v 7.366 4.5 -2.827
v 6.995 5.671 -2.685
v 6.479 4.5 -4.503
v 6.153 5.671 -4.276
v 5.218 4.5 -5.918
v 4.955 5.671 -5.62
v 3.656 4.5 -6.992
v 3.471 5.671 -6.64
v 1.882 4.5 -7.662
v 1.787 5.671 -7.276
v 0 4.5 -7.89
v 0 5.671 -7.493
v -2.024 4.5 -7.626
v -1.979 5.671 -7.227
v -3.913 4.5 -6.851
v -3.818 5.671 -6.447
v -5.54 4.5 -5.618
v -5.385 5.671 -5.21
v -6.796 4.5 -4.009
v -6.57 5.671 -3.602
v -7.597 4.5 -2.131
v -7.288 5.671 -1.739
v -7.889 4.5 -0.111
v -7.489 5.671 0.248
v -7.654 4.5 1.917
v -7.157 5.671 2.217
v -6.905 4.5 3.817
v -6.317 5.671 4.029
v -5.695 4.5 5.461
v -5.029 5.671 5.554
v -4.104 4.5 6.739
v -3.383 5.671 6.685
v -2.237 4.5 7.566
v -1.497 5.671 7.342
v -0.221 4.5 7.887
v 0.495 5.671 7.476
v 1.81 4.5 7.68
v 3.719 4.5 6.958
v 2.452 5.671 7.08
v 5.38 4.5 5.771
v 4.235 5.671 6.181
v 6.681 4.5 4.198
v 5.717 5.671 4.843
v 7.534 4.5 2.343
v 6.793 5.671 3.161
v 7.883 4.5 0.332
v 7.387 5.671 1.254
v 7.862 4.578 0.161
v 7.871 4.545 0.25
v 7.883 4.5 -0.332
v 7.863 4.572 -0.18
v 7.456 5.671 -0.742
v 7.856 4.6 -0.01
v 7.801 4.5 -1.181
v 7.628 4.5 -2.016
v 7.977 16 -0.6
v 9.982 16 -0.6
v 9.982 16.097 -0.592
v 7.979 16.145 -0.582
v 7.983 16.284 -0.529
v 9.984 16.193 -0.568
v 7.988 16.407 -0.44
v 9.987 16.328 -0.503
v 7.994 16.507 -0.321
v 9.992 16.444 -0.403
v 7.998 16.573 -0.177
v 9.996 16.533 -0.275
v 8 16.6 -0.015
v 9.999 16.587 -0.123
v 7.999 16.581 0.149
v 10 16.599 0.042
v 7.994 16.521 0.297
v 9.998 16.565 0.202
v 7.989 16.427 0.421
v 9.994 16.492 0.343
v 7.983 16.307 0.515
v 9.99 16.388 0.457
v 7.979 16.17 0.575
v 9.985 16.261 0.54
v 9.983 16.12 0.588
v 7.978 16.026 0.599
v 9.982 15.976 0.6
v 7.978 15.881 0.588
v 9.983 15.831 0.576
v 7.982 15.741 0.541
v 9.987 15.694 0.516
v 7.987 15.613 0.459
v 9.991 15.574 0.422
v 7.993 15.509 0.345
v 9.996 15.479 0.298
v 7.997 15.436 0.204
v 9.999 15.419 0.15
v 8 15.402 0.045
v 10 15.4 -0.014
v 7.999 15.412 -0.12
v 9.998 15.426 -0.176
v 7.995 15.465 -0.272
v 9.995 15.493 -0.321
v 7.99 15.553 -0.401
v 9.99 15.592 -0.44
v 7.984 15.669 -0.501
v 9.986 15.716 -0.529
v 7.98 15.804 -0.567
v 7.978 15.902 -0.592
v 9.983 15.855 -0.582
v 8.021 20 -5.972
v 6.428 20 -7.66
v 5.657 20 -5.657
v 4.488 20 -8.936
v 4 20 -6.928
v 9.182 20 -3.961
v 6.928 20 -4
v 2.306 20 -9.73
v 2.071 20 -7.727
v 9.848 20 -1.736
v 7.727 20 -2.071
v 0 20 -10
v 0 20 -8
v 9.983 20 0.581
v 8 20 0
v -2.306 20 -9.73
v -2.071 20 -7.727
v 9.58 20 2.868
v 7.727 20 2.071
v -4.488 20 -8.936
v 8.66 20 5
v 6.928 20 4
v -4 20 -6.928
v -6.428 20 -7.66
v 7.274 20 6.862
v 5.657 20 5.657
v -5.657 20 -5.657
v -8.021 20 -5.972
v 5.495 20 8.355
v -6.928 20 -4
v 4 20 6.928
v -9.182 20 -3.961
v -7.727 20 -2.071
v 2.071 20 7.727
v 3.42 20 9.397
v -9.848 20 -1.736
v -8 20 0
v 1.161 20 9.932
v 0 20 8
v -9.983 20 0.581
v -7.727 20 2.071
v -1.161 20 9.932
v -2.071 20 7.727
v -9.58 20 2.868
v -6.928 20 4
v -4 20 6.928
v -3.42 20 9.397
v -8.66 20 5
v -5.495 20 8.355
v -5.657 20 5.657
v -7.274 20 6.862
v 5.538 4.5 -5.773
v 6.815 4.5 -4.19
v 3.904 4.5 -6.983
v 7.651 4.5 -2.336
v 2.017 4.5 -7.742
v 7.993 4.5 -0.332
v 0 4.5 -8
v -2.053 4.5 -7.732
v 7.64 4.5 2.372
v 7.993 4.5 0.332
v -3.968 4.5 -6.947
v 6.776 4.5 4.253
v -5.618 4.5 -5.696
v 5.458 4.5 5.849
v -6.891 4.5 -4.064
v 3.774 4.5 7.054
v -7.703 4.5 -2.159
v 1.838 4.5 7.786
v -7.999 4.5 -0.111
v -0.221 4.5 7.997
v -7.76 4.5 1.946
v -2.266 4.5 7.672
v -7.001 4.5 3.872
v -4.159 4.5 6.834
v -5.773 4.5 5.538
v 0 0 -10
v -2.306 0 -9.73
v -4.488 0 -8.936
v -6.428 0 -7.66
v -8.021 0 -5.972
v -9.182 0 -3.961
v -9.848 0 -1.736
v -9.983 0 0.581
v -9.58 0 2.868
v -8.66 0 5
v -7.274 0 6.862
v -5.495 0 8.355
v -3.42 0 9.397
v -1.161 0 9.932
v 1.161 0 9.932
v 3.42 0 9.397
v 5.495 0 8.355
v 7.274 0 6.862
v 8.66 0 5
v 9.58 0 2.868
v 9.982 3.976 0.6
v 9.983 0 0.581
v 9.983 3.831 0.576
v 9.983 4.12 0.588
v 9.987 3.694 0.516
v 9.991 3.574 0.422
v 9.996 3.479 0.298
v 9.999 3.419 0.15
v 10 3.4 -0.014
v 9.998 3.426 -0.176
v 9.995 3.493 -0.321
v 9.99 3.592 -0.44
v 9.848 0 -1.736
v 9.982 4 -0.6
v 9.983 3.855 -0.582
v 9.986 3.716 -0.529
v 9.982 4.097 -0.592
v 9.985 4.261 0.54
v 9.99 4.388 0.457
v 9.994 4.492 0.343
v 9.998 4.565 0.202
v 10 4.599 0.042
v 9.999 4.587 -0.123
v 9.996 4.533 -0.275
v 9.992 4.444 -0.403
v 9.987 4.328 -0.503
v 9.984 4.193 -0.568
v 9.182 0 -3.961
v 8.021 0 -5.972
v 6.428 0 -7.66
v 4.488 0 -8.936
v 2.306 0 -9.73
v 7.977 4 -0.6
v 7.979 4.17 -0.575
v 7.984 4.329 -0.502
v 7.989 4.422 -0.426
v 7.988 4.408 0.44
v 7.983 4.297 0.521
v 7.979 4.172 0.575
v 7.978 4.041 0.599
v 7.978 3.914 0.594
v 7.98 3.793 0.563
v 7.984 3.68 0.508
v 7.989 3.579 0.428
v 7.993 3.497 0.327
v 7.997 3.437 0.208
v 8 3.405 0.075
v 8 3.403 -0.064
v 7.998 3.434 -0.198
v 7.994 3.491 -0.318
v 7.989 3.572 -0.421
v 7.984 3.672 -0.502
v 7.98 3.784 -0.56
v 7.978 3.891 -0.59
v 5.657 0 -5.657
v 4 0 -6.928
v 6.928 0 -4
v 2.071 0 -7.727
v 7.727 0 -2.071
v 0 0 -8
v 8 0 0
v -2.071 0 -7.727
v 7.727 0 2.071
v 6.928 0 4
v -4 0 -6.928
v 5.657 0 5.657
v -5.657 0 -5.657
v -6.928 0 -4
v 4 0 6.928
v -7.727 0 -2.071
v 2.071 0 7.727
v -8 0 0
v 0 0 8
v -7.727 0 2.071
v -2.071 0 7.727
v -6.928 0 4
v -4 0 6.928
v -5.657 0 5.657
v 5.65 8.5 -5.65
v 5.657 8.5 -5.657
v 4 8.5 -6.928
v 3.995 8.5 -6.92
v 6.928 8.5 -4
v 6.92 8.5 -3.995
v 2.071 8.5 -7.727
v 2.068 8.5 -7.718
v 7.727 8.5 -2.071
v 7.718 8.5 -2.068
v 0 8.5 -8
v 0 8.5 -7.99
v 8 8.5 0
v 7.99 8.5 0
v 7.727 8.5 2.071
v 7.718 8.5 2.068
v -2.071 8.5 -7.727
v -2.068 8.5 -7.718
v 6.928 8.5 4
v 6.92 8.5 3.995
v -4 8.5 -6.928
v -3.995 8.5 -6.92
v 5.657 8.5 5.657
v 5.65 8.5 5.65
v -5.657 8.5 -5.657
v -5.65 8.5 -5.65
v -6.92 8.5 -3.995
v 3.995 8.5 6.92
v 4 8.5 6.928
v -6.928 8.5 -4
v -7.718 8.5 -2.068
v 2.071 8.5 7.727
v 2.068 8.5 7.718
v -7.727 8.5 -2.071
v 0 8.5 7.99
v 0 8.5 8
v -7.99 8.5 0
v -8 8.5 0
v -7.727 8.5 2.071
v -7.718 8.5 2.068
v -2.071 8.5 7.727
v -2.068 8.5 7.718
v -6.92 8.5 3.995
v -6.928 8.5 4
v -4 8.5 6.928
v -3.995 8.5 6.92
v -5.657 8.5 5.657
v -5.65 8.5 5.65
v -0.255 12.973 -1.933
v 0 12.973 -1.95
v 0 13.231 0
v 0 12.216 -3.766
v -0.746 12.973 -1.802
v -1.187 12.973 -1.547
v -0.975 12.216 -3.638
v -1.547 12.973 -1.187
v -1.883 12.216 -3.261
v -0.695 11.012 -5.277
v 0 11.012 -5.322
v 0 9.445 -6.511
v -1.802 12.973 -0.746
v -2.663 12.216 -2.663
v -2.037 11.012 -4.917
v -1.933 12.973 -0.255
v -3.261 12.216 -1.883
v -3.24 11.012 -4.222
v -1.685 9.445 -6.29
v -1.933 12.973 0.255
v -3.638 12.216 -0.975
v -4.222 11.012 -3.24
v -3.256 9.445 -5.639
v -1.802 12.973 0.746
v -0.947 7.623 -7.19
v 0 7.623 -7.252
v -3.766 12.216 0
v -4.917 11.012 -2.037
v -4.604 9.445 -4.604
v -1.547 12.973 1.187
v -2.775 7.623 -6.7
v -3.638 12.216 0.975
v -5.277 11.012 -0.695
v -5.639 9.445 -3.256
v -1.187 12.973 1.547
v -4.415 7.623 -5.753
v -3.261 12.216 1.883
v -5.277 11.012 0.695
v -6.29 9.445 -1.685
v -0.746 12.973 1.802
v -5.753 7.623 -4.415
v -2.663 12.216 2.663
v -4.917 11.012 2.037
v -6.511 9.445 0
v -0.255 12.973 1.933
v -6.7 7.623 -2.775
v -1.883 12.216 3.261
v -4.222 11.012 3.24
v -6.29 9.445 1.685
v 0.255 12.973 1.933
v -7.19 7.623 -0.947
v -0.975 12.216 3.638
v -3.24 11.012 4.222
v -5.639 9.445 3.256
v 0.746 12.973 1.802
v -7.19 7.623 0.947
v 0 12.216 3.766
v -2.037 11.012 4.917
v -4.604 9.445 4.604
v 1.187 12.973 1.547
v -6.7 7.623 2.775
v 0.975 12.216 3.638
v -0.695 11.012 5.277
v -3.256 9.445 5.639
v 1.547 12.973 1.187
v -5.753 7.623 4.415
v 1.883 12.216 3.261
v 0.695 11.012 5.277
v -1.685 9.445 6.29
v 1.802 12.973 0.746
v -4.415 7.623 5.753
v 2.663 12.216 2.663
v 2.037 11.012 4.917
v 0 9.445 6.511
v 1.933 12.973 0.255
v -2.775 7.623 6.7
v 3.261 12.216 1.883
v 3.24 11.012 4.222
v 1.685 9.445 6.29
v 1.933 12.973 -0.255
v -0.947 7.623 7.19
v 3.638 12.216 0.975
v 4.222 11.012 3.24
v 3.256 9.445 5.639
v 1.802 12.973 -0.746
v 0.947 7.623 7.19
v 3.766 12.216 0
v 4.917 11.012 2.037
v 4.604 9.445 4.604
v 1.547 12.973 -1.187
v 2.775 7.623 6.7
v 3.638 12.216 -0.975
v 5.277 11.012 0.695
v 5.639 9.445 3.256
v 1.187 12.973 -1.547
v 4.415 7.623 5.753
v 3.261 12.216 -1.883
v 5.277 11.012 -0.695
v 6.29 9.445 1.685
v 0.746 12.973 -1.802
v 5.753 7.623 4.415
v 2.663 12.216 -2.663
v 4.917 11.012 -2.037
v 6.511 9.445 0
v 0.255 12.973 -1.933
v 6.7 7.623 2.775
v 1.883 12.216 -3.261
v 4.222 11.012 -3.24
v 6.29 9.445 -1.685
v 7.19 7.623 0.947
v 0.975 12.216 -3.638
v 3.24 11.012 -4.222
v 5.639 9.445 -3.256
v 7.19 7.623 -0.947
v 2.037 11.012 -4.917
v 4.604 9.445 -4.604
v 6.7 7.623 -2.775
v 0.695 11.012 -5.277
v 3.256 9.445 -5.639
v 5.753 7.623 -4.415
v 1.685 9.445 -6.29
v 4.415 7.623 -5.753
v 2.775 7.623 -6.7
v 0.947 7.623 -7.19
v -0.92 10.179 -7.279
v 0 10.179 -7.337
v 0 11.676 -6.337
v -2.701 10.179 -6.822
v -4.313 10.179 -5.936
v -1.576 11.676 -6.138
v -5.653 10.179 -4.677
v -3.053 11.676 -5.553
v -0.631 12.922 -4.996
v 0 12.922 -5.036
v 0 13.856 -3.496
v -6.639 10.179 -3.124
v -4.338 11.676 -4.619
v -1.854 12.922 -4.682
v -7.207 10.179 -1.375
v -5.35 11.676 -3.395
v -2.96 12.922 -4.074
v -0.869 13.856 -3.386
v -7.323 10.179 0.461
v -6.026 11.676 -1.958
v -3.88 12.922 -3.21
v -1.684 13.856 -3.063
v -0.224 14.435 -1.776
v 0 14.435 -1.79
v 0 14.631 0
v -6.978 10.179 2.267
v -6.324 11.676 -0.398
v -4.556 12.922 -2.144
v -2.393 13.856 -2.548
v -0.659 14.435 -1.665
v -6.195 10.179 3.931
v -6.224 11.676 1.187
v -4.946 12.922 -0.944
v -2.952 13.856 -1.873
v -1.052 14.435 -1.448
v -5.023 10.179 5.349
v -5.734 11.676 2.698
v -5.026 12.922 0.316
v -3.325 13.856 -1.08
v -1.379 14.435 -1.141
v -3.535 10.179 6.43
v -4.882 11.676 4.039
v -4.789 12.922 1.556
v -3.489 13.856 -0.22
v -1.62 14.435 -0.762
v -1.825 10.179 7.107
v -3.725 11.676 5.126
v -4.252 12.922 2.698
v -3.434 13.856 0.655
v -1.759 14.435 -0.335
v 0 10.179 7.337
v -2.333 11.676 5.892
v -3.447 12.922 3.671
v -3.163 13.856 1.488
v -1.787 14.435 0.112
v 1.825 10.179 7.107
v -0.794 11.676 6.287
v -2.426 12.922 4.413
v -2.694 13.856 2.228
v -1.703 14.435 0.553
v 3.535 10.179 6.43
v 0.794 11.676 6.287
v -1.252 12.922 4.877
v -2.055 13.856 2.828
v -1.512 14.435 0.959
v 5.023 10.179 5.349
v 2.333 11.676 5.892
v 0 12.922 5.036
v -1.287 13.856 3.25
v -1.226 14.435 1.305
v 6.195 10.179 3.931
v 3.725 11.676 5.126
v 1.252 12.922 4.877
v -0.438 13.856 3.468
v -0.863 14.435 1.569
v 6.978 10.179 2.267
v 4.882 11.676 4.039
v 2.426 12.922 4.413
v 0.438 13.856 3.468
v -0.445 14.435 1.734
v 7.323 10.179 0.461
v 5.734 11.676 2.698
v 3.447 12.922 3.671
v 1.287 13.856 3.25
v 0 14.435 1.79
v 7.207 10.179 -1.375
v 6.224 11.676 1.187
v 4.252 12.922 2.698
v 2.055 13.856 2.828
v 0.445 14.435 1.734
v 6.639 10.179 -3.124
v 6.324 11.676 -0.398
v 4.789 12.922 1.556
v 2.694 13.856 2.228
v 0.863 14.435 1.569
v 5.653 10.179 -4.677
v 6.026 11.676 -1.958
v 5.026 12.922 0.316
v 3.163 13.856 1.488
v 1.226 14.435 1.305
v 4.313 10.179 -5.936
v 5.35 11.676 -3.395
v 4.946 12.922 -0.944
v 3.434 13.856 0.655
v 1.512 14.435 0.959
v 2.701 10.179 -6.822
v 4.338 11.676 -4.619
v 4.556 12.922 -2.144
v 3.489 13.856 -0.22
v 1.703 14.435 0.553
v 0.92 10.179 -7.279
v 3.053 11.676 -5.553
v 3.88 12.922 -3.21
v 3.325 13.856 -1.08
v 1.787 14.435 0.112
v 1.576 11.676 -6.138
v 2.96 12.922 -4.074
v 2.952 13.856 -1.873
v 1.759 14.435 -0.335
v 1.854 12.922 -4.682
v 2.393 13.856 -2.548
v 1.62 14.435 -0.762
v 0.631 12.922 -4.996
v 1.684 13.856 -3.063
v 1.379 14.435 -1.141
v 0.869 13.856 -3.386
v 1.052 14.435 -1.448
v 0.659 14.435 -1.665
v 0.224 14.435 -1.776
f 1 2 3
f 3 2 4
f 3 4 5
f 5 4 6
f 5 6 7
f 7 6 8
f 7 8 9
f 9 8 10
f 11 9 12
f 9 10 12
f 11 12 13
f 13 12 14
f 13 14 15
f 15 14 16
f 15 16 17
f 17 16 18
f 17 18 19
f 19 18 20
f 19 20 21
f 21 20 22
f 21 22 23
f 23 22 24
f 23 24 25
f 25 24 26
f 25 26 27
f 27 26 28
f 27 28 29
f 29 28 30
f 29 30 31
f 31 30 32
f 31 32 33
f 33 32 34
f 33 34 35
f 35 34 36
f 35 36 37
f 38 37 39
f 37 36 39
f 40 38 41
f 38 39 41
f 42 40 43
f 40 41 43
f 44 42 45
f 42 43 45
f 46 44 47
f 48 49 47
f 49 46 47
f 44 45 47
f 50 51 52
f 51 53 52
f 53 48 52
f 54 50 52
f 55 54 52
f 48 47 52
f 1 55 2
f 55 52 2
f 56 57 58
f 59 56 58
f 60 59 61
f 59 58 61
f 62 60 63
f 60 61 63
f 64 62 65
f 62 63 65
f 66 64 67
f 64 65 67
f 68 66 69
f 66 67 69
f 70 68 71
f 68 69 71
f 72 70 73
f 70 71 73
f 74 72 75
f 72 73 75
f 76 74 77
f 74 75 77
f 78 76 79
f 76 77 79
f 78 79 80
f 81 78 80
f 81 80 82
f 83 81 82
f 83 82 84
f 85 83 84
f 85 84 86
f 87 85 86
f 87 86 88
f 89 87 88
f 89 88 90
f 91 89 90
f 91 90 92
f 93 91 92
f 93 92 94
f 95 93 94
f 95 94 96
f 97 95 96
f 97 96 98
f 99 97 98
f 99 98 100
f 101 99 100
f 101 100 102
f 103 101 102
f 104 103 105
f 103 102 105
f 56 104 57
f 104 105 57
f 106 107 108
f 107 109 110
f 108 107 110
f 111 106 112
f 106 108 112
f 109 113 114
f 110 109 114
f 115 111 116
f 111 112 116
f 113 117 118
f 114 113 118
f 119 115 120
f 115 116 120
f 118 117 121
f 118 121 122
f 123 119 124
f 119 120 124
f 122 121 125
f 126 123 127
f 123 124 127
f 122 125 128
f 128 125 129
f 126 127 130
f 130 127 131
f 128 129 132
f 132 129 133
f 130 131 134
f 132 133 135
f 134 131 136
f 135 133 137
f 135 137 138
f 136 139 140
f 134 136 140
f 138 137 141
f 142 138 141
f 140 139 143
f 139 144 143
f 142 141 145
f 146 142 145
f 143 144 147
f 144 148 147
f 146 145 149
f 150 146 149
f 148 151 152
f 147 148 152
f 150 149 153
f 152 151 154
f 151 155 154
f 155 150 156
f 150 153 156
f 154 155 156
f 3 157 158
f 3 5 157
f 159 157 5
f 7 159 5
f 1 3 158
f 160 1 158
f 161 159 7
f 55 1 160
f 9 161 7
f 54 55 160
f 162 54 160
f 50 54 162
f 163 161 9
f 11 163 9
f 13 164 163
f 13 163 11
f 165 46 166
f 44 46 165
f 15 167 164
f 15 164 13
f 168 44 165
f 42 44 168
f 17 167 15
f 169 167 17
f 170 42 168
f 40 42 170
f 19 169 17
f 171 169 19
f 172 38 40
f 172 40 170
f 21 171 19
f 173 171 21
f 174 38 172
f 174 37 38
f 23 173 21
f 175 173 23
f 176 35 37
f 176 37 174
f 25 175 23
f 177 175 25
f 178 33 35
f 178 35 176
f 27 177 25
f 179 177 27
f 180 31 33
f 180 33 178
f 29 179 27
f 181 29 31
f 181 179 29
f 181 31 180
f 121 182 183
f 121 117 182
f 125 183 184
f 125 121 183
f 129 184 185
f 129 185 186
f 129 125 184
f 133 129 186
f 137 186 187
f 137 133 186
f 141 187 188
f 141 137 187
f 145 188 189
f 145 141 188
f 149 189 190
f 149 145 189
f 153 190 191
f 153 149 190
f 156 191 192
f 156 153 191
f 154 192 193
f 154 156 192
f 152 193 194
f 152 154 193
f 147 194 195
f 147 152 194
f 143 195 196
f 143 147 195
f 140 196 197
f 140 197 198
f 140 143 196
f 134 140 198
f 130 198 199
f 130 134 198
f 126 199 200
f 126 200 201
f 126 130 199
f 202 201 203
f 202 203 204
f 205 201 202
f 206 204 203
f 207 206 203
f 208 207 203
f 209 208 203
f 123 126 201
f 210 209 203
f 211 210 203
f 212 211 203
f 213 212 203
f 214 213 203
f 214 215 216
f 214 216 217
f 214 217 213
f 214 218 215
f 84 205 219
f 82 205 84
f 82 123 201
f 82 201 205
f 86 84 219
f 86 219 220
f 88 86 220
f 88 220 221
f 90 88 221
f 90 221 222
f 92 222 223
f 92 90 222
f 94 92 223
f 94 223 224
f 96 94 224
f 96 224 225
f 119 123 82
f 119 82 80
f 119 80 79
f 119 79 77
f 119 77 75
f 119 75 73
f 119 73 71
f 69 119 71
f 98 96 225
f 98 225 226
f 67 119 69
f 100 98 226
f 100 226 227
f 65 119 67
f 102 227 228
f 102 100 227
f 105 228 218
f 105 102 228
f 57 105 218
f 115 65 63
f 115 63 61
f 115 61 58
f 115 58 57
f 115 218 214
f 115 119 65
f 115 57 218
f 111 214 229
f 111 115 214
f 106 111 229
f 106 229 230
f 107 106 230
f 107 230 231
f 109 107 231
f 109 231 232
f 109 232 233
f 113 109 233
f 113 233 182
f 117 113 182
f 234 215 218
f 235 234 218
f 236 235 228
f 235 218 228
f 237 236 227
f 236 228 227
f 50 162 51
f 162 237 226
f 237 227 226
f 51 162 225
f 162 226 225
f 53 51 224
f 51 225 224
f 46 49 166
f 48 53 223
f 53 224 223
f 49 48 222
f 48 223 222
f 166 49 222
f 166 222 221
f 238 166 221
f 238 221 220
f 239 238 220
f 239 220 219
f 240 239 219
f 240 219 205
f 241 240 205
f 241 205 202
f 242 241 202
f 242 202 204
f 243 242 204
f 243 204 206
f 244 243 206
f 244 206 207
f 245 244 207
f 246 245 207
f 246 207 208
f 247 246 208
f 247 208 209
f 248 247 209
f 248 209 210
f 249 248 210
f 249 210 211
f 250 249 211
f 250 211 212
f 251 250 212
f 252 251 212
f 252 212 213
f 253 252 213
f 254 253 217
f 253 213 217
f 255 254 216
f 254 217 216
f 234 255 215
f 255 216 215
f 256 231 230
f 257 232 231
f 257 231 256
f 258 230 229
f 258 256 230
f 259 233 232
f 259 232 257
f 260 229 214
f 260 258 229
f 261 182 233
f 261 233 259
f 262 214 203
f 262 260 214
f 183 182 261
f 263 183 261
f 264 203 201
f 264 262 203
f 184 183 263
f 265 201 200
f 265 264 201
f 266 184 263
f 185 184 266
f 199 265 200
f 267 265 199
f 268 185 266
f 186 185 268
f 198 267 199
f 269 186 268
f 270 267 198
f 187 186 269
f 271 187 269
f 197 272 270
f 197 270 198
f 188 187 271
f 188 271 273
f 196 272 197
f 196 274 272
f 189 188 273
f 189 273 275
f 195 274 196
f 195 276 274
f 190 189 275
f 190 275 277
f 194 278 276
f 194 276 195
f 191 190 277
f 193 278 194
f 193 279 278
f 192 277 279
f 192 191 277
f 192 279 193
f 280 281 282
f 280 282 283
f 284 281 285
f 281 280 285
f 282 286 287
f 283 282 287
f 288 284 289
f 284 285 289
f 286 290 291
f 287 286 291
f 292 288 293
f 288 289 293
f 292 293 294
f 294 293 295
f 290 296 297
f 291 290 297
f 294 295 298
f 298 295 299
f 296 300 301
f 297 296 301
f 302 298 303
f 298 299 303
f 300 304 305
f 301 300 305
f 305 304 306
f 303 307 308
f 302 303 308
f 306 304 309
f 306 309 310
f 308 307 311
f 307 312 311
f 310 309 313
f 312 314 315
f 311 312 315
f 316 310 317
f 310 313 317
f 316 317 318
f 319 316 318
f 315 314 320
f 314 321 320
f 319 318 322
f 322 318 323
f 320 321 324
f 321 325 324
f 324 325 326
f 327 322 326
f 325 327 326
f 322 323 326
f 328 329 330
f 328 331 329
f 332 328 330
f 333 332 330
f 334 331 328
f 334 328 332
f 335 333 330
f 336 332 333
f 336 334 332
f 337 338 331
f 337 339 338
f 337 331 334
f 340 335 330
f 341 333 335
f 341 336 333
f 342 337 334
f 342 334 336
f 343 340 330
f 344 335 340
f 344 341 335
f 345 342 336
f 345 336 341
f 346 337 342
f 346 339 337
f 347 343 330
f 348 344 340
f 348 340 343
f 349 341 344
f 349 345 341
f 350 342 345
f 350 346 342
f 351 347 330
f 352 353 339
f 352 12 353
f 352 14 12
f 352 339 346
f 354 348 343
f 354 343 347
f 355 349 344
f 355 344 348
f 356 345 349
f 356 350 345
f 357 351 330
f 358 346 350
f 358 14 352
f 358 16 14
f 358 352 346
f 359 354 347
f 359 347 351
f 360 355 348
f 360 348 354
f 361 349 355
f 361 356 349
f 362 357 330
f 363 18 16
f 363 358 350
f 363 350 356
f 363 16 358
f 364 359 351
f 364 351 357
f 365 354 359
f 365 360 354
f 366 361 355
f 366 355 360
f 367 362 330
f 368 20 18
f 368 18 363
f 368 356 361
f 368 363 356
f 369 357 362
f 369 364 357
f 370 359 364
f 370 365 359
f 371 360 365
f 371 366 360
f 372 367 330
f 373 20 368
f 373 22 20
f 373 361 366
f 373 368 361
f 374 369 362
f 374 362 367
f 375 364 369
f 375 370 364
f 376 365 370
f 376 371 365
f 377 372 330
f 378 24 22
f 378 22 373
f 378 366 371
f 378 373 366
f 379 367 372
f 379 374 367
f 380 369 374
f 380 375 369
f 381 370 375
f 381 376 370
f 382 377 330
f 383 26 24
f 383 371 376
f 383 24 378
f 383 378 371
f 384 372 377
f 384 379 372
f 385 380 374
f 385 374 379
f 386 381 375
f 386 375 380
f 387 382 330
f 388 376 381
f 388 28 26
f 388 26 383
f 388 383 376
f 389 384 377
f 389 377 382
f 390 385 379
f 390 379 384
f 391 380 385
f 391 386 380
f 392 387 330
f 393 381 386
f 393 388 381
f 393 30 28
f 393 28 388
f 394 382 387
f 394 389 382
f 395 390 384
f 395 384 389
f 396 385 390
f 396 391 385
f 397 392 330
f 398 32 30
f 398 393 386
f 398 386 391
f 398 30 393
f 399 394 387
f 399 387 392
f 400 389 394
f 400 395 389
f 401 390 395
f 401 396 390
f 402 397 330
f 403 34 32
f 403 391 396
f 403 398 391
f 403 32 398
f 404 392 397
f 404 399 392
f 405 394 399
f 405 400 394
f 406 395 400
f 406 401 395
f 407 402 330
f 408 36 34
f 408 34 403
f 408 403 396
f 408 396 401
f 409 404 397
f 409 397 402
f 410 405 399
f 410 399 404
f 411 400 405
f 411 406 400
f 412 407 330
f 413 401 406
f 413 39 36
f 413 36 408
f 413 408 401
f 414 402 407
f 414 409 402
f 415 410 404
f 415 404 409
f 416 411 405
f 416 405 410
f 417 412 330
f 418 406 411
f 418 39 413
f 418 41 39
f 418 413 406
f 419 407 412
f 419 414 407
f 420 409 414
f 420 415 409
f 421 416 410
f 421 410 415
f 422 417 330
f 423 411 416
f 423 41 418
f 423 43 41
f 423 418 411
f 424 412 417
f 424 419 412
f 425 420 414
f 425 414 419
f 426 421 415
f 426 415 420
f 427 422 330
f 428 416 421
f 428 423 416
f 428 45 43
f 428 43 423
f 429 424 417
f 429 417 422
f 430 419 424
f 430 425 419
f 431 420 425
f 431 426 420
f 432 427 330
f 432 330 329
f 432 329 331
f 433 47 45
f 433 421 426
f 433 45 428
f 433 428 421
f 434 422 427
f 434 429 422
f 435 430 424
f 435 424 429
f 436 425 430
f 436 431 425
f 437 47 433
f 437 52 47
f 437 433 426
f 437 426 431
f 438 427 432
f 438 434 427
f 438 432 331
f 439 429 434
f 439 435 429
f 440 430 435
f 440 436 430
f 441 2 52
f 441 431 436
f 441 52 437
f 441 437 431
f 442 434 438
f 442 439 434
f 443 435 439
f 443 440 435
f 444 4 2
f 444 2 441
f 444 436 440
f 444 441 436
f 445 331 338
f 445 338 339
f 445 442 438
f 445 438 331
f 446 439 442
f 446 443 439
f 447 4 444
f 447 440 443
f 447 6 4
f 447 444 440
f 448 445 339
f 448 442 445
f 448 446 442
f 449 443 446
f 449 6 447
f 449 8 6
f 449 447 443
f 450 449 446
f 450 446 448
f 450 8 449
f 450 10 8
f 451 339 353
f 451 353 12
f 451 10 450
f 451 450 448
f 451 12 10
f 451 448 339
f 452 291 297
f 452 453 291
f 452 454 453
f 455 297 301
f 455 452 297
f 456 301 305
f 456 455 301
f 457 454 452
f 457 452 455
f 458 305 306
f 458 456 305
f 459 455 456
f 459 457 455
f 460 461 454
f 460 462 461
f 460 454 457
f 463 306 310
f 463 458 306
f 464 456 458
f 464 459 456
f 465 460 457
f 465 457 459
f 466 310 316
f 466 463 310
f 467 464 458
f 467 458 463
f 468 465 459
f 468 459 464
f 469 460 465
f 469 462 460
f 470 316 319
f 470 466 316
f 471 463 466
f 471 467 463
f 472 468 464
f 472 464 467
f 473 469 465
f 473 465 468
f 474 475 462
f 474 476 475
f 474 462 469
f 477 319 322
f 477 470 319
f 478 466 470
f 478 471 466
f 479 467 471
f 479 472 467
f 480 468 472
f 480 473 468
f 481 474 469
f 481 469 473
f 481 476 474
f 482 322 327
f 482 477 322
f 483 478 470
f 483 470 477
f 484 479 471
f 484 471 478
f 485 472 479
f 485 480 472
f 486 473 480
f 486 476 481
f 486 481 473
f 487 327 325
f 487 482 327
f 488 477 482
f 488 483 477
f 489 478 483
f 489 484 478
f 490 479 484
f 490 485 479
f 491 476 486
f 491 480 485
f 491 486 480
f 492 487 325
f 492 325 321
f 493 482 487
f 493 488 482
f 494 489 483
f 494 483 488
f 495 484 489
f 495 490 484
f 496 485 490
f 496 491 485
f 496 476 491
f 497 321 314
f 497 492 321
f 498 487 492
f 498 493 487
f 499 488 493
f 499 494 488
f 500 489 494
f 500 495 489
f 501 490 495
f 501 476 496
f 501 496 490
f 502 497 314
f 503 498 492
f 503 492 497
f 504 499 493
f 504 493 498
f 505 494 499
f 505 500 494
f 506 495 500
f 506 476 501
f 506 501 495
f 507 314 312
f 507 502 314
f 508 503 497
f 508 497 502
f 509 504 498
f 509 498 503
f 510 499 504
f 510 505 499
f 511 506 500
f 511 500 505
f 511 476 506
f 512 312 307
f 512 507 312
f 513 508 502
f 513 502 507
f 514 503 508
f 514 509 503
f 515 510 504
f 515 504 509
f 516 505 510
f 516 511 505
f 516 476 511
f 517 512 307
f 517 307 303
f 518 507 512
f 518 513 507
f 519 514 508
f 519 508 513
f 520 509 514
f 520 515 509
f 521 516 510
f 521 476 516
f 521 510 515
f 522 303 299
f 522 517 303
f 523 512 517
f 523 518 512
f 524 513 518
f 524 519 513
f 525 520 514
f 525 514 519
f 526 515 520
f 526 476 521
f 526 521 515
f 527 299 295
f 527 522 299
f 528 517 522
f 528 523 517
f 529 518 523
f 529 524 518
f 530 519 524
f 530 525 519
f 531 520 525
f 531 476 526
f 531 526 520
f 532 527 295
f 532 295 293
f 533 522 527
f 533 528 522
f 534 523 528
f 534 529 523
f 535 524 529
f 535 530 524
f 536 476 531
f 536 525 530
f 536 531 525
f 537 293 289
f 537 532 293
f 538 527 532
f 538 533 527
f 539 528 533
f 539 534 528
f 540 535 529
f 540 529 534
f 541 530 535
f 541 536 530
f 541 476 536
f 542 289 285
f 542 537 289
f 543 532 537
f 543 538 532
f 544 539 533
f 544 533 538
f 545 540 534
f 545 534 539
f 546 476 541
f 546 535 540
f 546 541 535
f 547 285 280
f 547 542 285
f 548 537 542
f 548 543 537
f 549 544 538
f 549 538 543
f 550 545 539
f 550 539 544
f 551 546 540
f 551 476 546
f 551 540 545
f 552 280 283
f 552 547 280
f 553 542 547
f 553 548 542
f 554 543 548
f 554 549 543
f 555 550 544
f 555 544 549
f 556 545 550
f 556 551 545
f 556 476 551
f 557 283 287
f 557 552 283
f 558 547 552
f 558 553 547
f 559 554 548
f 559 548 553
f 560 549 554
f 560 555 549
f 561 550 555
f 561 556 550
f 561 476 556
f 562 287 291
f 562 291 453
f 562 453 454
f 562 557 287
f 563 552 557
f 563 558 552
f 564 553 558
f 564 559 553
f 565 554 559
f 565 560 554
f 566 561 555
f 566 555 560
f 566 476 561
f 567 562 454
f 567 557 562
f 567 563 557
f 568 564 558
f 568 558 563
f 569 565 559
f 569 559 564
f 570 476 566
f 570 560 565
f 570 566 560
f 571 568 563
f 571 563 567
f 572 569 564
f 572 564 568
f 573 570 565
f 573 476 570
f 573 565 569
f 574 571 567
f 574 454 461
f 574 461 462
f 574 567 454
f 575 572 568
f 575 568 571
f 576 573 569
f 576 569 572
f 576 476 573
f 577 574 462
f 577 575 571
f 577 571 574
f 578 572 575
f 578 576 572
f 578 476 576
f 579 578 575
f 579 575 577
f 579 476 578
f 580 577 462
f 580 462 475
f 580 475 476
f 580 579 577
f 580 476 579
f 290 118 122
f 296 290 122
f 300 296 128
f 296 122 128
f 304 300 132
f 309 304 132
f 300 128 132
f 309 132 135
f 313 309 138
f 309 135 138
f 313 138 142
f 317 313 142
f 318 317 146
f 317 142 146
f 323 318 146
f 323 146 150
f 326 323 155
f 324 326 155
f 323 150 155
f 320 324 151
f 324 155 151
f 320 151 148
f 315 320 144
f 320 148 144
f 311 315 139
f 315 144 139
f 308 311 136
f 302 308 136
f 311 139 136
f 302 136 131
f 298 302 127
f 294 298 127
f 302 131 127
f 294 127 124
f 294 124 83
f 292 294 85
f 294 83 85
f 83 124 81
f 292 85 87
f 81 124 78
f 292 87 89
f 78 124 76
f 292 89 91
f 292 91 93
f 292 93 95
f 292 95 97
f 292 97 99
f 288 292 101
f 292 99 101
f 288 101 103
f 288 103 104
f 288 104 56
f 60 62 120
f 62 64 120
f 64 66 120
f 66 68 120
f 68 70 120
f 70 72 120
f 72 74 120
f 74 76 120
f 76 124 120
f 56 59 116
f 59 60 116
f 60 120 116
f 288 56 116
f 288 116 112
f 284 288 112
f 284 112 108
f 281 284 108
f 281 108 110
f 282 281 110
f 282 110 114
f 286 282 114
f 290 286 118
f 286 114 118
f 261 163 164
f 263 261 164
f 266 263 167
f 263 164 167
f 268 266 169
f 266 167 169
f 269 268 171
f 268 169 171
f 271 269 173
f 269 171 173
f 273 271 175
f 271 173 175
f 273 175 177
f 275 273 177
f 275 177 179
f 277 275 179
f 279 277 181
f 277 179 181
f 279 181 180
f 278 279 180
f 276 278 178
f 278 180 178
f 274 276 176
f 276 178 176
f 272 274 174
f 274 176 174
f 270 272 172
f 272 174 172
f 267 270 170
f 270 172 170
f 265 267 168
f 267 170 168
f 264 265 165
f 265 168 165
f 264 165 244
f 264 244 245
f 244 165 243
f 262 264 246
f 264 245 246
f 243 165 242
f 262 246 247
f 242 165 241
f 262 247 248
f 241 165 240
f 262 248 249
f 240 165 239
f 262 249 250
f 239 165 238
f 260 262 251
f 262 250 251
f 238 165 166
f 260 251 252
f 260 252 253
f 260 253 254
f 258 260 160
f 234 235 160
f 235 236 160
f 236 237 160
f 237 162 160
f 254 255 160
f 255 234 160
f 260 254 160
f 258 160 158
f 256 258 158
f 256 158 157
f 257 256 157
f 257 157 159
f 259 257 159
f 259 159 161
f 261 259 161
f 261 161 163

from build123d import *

# Parameters (mm, degrees)
SKETCH1_W          = 0.01
SKETCH1_H          = 4
SKETCH1_W_2        = 2
SKETCH1_H_2        = 20
CUT_EXTRUDE1_REACH = 32
SKETCH2_R          = 0.6
CHAMFER1_SIZE      = 0.5


with BuildPart() as part:
    # Sketch1 → Revolve1 (revolve)
    with BuildSketch(Plane.XY, mode=Mode.PRIVATE) as revolve1_sk:
        with BuildLine():
            Line((0, 14.630942634), (0, 13.230942634))
            ThreePointArc((0, 13.230942634), (5.719297581, 10.578866966), (7.39, 4.5))
            Line((7.39, 4.5), (7.99, 4.5))
            Line((7.99, 4.5), (7.99, 8.5))
            ThreePointArc((7.99, 8.5), (5.035587294, 12.921591081), (0, 14.630942634))
        make_face()
        with Locations((7.995, 6.5)):
            Rectangle(SKETCH1_W, SKETCH1_H)
        with Locations((9, 10)):
            Rectangle(SKETCH1_W_2, SKETCH1_H_2)
    revolve(revolve1_sk.sketch.rotate(Axis((0, 0, 0), (0, 1, 0)), 90), axis=Axis((0, 0, 0), (0, 1, 0)))

    # Sketch2 → Cut-Extrude1 (cut, up to next)
    with BuildSketch(Plane(origin=(10, 0, 0), x_dir=(0, 0, -1), z_dir=(1, 0, 0)), mode=Mode.PRIVATE) as cut_extrude1_sk1:
        with Locations((0, 16)):
            Circle(SKETCH2_R)
    cut_extrude1_tool1 = extrude(cut_extrude1_sk1.sketch, amount=-CUT_EXTRUDE1_REACH, mode=Mode.PRIVATE) & part.part
    # Sketch2 → Cut-Extrude1 (cut, up to next)
    with BuildSketch(Plane(origin=(10, 0, 0), x_dir=(0, 0, -1), z_dir=(1, 0, 0)), mode=Mode.PRIVATE) as cut_extrude1_sk2:
        with Locations((0, 4)):
            Circle(SKETCH2_R)
    cut_extrude1_tool2 = extrude(cut_extrude1_sk2.sketch, amount=-CUT_EXTRUDE1_REACH, mode=Mode.PRIVATE) & part.part
    add(cut_extrude1_tool1.solids().sort_by_distance((10, 16, 0))[0], mode=Mode.SUBTRACT)
    add(cut_extrude1_tool2.solids().sort_by_distance((10, 4, 0))[0], mode=Mode.SUBTRACT)

    # Chamfer1
    # the kernel refuses this chamfer: 1, 0.5 mm, written as the material it takes off along each edge
    with BuildSketch(Plane(origin=(0, 4.5, 0), x_dir=(0, 0, -1), z_dir=(1, 0, 0))) as chamfer1_piece_1:
        with BuildLine():
            Line((7.39 + CHAMFER1_SIZE, 0), (7.492670793, 1.1705165))
            ThreePointArc((7.492670793, 1.1705165), (7.465898714, 0.601555049), (7.39, 0))
            Line((7.39, 0), (7.39 + CHAMFER1_SIZE, 0))
        make_face()
    revolve(axis=Axis((0, 4.5, 0), (0, 1, 0)), revolution_arc=290.997944541, mode=Mode.SUBTRACT)
    with BuildSketch(Plane(origin=(0, 4.5, 0), x_dir=(0.9340589469331272, 0, 0.3571188648813968), z_dir=(-0.3571188648813968, 0, 0.9340589469331272))) as chamfer1_piece_2:
        with BuildLine():
            Line((7.39 + CHAMFER1_SIZE, 0), (7.492670793, 1.1705165))
            ThreePointArc((7.492670793, 1.1705165), (7.465898714, 0.601555049), (7.39, 0))
            Line((7.39, 0), (7.39 + CHAMFER1_SIZE, 0))
        make_face()
    revolve(axis=Axis((0, 4.5, 0), (0, 1, 0)), revolution_arc=110.92336072, mode=Mode.SUBTRACT)


solid = part.part
